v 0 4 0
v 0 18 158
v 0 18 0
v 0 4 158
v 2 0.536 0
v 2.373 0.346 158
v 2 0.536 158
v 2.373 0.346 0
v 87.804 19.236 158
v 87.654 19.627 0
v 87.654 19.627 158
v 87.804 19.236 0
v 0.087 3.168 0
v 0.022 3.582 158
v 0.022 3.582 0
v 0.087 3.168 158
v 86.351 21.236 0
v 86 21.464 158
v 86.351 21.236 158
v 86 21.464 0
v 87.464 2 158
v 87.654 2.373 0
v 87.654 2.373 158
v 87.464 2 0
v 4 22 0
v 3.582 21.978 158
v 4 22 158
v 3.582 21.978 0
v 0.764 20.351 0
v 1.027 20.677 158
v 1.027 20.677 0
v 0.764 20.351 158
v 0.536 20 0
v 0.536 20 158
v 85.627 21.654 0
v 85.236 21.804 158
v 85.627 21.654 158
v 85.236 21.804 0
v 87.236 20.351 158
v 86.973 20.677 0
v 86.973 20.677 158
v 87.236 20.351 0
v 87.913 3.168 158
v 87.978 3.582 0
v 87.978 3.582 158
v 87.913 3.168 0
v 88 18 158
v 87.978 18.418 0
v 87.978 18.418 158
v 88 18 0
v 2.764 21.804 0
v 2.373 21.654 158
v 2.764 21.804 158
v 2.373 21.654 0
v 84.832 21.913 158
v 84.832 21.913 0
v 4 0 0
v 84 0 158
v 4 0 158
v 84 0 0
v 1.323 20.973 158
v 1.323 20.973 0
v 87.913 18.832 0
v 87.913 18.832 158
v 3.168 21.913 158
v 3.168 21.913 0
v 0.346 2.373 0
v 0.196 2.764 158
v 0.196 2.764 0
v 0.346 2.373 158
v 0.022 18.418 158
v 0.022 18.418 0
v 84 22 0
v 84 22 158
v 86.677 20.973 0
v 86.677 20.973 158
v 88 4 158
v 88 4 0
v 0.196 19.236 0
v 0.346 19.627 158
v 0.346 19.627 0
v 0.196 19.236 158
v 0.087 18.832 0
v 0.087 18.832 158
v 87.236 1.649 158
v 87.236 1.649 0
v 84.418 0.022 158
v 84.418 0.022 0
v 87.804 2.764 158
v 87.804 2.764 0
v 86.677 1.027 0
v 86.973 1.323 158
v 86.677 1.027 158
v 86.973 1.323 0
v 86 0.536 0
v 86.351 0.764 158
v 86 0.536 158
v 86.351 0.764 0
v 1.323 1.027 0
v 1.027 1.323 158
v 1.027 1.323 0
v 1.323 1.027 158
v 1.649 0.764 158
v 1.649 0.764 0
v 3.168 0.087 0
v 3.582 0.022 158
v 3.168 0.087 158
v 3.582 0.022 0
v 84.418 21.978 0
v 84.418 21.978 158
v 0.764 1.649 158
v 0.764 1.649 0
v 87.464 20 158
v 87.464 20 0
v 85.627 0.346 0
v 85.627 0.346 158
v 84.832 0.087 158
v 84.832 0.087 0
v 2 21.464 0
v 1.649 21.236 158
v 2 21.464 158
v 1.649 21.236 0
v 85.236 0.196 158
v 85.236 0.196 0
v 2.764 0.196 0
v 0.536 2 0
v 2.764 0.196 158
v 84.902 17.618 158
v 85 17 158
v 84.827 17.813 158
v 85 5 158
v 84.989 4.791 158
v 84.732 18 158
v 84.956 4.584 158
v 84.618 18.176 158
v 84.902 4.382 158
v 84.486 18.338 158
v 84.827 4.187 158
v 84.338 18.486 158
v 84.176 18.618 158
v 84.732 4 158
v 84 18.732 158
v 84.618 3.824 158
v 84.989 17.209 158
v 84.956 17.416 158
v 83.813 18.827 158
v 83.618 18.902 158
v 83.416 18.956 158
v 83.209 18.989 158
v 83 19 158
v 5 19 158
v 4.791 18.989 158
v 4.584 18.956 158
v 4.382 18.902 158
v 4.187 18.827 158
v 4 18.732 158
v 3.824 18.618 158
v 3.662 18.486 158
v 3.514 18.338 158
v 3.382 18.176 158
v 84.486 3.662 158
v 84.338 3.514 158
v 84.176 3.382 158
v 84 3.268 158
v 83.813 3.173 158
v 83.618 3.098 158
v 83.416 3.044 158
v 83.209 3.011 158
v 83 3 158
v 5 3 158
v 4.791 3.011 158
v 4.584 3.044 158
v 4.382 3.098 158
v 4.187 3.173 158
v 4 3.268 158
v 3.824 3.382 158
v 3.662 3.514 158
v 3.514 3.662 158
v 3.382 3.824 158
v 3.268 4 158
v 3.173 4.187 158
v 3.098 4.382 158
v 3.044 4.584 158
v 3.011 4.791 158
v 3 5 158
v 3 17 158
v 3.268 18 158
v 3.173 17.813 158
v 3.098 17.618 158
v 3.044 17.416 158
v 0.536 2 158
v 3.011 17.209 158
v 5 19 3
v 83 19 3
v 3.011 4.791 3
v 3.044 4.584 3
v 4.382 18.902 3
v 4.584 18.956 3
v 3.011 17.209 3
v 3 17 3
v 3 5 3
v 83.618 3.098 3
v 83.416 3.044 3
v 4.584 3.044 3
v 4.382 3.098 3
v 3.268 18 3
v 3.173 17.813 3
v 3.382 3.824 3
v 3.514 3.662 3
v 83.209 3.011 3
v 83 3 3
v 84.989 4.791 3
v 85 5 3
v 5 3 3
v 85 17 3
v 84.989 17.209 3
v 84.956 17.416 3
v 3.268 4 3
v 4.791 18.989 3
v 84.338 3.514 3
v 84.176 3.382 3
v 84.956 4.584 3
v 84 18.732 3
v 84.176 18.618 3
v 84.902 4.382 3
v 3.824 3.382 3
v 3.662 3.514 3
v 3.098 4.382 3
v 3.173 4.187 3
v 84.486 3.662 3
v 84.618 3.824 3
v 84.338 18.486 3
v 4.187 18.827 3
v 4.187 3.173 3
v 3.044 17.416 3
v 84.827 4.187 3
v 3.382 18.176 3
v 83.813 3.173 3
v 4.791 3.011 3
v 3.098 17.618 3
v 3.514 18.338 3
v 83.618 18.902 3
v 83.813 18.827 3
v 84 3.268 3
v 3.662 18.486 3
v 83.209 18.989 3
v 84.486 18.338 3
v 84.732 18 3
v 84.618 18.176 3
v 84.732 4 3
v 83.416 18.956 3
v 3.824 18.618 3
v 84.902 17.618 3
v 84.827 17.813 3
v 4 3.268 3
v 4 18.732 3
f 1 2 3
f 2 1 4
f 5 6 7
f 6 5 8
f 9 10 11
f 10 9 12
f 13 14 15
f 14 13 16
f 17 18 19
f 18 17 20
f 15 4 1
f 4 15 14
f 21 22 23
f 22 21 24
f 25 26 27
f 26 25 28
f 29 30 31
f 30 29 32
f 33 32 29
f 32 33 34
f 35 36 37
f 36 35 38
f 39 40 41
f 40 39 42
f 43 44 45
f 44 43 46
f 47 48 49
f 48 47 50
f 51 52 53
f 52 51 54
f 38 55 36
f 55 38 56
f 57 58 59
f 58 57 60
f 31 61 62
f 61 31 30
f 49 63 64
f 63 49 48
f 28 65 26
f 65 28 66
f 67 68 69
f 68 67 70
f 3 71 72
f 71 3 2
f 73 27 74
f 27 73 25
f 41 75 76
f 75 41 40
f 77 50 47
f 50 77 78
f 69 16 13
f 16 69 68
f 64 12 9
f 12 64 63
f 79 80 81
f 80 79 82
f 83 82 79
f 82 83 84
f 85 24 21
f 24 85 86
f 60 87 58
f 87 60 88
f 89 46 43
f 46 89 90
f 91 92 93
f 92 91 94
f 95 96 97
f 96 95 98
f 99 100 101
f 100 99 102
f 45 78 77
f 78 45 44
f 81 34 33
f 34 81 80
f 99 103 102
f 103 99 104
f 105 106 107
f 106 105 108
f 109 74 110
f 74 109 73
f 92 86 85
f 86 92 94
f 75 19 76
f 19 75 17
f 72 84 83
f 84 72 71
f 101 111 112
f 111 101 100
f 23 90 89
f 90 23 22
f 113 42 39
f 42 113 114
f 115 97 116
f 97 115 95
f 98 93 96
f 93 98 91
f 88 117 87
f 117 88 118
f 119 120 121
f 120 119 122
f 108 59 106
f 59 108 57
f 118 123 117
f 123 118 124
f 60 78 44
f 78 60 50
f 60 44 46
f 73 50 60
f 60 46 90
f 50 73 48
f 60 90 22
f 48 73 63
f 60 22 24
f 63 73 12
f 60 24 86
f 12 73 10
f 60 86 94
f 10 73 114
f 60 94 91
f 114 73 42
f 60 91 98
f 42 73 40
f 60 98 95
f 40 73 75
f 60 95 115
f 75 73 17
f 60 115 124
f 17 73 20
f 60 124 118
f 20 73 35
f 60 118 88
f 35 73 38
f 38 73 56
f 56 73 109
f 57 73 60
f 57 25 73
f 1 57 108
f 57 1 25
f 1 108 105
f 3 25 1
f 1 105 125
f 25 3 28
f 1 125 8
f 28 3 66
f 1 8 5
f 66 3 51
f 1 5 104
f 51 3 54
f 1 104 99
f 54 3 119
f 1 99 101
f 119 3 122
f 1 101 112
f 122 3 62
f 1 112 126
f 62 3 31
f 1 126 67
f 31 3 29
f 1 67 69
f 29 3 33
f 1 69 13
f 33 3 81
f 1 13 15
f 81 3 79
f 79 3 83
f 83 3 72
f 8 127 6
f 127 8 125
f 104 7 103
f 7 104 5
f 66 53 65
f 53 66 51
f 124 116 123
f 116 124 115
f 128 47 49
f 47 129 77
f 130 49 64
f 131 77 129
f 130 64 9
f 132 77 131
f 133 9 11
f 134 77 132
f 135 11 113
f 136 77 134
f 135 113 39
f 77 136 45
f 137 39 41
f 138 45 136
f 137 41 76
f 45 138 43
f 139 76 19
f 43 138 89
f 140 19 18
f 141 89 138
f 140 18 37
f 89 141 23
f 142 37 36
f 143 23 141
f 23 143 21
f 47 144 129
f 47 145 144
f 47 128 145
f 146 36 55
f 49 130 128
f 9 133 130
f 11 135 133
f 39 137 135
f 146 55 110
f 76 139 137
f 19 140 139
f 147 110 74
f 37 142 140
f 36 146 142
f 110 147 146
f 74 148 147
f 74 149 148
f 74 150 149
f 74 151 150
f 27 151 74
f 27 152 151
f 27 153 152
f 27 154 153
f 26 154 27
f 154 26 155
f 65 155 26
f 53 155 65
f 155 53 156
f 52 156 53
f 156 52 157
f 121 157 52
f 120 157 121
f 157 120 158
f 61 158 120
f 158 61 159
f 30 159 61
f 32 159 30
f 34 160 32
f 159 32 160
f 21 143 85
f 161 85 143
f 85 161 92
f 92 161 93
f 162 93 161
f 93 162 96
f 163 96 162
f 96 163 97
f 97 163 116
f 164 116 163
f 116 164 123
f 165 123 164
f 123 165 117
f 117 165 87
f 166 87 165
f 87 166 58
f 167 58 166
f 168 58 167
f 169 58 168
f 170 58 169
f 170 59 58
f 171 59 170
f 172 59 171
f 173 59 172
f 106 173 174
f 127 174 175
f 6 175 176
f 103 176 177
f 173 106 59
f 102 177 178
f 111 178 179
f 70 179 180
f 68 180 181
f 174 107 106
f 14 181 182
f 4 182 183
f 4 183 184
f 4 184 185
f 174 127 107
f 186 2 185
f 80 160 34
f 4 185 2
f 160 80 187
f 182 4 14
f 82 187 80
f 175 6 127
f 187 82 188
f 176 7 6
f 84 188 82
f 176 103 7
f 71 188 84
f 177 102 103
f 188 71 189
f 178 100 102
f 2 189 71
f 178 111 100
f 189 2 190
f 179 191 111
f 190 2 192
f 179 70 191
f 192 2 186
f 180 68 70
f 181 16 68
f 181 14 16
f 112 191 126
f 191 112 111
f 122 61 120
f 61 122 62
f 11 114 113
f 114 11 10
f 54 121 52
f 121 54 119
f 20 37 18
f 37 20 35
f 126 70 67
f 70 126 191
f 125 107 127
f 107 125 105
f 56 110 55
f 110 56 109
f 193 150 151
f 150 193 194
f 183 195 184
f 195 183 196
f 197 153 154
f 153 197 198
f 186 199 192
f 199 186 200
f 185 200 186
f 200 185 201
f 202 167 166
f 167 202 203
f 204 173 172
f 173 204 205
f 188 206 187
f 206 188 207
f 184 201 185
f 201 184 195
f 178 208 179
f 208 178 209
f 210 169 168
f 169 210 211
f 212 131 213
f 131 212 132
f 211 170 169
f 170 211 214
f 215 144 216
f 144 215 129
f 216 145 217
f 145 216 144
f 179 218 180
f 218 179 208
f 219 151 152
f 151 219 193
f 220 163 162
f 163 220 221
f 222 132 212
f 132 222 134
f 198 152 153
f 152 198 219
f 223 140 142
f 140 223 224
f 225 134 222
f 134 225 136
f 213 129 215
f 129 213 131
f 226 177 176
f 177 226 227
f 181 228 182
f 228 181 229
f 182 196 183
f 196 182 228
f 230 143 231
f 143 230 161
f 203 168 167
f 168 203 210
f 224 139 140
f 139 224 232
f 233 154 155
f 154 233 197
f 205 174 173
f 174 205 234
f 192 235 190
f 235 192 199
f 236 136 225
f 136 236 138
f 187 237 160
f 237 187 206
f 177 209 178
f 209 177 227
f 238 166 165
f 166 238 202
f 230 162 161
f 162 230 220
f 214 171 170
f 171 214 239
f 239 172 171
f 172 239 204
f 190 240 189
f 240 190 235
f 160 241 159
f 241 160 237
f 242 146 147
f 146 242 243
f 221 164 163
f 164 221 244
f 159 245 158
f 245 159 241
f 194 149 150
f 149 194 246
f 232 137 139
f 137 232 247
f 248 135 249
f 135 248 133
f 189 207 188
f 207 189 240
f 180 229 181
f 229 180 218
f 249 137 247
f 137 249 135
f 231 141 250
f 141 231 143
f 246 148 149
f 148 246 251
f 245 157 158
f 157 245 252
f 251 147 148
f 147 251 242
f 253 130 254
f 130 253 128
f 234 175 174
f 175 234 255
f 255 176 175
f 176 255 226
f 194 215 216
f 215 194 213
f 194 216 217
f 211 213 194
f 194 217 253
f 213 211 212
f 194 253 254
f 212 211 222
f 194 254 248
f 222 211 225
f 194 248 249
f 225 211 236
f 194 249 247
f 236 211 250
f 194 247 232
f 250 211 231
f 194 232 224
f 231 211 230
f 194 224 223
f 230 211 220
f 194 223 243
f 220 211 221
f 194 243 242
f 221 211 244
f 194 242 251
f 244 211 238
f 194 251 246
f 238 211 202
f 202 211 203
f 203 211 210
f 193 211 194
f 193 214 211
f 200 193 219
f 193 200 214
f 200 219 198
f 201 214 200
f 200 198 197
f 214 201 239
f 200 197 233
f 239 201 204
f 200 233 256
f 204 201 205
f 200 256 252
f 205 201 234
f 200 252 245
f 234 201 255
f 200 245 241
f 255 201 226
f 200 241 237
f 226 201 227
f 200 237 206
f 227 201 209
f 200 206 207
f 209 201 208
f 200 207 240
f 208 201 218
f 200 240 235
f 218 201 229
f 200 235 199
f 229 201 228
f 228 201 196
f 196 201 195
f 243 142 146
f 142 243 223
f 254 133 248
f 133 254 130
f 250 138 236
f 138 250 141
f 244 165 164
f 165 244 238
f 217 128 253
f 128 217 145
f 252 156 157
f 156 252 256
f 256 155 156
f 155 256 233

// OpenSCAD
// phone clearance
phone_w = 82;
phone_d = 16;
phone_h = 155;

// wall thickness
wall_t = 3;
floor_t = 3;
corner_r = 4;

$fn = 60;

box_w = phone_w + 2 * wall_t;
box_d = phone_d + 2 * wall_t;
box_h = phone_h + floor_t;

eps = 0.05;

// fast rounded box
module rounded_box(w, d, h, r) {
    linear_extrude(height = h) {
        hull() {
            translate([r, r]) circle(r = r);
            translate([w - r, r]) circle(r = r);
            translate([w - r, d - r]) circle(r = r);
            translate([r, d - r]) circle(r = r);
        }
    }
}

// main body
difference() {
    rounded_box(box_w, box_d, box_h, corner_r);
    
    // phone cavity
    translate([wall_t, wall_t, floor_t])
        rounded_box(phone_w, phone_d, phone_h + 10, 2);
}
